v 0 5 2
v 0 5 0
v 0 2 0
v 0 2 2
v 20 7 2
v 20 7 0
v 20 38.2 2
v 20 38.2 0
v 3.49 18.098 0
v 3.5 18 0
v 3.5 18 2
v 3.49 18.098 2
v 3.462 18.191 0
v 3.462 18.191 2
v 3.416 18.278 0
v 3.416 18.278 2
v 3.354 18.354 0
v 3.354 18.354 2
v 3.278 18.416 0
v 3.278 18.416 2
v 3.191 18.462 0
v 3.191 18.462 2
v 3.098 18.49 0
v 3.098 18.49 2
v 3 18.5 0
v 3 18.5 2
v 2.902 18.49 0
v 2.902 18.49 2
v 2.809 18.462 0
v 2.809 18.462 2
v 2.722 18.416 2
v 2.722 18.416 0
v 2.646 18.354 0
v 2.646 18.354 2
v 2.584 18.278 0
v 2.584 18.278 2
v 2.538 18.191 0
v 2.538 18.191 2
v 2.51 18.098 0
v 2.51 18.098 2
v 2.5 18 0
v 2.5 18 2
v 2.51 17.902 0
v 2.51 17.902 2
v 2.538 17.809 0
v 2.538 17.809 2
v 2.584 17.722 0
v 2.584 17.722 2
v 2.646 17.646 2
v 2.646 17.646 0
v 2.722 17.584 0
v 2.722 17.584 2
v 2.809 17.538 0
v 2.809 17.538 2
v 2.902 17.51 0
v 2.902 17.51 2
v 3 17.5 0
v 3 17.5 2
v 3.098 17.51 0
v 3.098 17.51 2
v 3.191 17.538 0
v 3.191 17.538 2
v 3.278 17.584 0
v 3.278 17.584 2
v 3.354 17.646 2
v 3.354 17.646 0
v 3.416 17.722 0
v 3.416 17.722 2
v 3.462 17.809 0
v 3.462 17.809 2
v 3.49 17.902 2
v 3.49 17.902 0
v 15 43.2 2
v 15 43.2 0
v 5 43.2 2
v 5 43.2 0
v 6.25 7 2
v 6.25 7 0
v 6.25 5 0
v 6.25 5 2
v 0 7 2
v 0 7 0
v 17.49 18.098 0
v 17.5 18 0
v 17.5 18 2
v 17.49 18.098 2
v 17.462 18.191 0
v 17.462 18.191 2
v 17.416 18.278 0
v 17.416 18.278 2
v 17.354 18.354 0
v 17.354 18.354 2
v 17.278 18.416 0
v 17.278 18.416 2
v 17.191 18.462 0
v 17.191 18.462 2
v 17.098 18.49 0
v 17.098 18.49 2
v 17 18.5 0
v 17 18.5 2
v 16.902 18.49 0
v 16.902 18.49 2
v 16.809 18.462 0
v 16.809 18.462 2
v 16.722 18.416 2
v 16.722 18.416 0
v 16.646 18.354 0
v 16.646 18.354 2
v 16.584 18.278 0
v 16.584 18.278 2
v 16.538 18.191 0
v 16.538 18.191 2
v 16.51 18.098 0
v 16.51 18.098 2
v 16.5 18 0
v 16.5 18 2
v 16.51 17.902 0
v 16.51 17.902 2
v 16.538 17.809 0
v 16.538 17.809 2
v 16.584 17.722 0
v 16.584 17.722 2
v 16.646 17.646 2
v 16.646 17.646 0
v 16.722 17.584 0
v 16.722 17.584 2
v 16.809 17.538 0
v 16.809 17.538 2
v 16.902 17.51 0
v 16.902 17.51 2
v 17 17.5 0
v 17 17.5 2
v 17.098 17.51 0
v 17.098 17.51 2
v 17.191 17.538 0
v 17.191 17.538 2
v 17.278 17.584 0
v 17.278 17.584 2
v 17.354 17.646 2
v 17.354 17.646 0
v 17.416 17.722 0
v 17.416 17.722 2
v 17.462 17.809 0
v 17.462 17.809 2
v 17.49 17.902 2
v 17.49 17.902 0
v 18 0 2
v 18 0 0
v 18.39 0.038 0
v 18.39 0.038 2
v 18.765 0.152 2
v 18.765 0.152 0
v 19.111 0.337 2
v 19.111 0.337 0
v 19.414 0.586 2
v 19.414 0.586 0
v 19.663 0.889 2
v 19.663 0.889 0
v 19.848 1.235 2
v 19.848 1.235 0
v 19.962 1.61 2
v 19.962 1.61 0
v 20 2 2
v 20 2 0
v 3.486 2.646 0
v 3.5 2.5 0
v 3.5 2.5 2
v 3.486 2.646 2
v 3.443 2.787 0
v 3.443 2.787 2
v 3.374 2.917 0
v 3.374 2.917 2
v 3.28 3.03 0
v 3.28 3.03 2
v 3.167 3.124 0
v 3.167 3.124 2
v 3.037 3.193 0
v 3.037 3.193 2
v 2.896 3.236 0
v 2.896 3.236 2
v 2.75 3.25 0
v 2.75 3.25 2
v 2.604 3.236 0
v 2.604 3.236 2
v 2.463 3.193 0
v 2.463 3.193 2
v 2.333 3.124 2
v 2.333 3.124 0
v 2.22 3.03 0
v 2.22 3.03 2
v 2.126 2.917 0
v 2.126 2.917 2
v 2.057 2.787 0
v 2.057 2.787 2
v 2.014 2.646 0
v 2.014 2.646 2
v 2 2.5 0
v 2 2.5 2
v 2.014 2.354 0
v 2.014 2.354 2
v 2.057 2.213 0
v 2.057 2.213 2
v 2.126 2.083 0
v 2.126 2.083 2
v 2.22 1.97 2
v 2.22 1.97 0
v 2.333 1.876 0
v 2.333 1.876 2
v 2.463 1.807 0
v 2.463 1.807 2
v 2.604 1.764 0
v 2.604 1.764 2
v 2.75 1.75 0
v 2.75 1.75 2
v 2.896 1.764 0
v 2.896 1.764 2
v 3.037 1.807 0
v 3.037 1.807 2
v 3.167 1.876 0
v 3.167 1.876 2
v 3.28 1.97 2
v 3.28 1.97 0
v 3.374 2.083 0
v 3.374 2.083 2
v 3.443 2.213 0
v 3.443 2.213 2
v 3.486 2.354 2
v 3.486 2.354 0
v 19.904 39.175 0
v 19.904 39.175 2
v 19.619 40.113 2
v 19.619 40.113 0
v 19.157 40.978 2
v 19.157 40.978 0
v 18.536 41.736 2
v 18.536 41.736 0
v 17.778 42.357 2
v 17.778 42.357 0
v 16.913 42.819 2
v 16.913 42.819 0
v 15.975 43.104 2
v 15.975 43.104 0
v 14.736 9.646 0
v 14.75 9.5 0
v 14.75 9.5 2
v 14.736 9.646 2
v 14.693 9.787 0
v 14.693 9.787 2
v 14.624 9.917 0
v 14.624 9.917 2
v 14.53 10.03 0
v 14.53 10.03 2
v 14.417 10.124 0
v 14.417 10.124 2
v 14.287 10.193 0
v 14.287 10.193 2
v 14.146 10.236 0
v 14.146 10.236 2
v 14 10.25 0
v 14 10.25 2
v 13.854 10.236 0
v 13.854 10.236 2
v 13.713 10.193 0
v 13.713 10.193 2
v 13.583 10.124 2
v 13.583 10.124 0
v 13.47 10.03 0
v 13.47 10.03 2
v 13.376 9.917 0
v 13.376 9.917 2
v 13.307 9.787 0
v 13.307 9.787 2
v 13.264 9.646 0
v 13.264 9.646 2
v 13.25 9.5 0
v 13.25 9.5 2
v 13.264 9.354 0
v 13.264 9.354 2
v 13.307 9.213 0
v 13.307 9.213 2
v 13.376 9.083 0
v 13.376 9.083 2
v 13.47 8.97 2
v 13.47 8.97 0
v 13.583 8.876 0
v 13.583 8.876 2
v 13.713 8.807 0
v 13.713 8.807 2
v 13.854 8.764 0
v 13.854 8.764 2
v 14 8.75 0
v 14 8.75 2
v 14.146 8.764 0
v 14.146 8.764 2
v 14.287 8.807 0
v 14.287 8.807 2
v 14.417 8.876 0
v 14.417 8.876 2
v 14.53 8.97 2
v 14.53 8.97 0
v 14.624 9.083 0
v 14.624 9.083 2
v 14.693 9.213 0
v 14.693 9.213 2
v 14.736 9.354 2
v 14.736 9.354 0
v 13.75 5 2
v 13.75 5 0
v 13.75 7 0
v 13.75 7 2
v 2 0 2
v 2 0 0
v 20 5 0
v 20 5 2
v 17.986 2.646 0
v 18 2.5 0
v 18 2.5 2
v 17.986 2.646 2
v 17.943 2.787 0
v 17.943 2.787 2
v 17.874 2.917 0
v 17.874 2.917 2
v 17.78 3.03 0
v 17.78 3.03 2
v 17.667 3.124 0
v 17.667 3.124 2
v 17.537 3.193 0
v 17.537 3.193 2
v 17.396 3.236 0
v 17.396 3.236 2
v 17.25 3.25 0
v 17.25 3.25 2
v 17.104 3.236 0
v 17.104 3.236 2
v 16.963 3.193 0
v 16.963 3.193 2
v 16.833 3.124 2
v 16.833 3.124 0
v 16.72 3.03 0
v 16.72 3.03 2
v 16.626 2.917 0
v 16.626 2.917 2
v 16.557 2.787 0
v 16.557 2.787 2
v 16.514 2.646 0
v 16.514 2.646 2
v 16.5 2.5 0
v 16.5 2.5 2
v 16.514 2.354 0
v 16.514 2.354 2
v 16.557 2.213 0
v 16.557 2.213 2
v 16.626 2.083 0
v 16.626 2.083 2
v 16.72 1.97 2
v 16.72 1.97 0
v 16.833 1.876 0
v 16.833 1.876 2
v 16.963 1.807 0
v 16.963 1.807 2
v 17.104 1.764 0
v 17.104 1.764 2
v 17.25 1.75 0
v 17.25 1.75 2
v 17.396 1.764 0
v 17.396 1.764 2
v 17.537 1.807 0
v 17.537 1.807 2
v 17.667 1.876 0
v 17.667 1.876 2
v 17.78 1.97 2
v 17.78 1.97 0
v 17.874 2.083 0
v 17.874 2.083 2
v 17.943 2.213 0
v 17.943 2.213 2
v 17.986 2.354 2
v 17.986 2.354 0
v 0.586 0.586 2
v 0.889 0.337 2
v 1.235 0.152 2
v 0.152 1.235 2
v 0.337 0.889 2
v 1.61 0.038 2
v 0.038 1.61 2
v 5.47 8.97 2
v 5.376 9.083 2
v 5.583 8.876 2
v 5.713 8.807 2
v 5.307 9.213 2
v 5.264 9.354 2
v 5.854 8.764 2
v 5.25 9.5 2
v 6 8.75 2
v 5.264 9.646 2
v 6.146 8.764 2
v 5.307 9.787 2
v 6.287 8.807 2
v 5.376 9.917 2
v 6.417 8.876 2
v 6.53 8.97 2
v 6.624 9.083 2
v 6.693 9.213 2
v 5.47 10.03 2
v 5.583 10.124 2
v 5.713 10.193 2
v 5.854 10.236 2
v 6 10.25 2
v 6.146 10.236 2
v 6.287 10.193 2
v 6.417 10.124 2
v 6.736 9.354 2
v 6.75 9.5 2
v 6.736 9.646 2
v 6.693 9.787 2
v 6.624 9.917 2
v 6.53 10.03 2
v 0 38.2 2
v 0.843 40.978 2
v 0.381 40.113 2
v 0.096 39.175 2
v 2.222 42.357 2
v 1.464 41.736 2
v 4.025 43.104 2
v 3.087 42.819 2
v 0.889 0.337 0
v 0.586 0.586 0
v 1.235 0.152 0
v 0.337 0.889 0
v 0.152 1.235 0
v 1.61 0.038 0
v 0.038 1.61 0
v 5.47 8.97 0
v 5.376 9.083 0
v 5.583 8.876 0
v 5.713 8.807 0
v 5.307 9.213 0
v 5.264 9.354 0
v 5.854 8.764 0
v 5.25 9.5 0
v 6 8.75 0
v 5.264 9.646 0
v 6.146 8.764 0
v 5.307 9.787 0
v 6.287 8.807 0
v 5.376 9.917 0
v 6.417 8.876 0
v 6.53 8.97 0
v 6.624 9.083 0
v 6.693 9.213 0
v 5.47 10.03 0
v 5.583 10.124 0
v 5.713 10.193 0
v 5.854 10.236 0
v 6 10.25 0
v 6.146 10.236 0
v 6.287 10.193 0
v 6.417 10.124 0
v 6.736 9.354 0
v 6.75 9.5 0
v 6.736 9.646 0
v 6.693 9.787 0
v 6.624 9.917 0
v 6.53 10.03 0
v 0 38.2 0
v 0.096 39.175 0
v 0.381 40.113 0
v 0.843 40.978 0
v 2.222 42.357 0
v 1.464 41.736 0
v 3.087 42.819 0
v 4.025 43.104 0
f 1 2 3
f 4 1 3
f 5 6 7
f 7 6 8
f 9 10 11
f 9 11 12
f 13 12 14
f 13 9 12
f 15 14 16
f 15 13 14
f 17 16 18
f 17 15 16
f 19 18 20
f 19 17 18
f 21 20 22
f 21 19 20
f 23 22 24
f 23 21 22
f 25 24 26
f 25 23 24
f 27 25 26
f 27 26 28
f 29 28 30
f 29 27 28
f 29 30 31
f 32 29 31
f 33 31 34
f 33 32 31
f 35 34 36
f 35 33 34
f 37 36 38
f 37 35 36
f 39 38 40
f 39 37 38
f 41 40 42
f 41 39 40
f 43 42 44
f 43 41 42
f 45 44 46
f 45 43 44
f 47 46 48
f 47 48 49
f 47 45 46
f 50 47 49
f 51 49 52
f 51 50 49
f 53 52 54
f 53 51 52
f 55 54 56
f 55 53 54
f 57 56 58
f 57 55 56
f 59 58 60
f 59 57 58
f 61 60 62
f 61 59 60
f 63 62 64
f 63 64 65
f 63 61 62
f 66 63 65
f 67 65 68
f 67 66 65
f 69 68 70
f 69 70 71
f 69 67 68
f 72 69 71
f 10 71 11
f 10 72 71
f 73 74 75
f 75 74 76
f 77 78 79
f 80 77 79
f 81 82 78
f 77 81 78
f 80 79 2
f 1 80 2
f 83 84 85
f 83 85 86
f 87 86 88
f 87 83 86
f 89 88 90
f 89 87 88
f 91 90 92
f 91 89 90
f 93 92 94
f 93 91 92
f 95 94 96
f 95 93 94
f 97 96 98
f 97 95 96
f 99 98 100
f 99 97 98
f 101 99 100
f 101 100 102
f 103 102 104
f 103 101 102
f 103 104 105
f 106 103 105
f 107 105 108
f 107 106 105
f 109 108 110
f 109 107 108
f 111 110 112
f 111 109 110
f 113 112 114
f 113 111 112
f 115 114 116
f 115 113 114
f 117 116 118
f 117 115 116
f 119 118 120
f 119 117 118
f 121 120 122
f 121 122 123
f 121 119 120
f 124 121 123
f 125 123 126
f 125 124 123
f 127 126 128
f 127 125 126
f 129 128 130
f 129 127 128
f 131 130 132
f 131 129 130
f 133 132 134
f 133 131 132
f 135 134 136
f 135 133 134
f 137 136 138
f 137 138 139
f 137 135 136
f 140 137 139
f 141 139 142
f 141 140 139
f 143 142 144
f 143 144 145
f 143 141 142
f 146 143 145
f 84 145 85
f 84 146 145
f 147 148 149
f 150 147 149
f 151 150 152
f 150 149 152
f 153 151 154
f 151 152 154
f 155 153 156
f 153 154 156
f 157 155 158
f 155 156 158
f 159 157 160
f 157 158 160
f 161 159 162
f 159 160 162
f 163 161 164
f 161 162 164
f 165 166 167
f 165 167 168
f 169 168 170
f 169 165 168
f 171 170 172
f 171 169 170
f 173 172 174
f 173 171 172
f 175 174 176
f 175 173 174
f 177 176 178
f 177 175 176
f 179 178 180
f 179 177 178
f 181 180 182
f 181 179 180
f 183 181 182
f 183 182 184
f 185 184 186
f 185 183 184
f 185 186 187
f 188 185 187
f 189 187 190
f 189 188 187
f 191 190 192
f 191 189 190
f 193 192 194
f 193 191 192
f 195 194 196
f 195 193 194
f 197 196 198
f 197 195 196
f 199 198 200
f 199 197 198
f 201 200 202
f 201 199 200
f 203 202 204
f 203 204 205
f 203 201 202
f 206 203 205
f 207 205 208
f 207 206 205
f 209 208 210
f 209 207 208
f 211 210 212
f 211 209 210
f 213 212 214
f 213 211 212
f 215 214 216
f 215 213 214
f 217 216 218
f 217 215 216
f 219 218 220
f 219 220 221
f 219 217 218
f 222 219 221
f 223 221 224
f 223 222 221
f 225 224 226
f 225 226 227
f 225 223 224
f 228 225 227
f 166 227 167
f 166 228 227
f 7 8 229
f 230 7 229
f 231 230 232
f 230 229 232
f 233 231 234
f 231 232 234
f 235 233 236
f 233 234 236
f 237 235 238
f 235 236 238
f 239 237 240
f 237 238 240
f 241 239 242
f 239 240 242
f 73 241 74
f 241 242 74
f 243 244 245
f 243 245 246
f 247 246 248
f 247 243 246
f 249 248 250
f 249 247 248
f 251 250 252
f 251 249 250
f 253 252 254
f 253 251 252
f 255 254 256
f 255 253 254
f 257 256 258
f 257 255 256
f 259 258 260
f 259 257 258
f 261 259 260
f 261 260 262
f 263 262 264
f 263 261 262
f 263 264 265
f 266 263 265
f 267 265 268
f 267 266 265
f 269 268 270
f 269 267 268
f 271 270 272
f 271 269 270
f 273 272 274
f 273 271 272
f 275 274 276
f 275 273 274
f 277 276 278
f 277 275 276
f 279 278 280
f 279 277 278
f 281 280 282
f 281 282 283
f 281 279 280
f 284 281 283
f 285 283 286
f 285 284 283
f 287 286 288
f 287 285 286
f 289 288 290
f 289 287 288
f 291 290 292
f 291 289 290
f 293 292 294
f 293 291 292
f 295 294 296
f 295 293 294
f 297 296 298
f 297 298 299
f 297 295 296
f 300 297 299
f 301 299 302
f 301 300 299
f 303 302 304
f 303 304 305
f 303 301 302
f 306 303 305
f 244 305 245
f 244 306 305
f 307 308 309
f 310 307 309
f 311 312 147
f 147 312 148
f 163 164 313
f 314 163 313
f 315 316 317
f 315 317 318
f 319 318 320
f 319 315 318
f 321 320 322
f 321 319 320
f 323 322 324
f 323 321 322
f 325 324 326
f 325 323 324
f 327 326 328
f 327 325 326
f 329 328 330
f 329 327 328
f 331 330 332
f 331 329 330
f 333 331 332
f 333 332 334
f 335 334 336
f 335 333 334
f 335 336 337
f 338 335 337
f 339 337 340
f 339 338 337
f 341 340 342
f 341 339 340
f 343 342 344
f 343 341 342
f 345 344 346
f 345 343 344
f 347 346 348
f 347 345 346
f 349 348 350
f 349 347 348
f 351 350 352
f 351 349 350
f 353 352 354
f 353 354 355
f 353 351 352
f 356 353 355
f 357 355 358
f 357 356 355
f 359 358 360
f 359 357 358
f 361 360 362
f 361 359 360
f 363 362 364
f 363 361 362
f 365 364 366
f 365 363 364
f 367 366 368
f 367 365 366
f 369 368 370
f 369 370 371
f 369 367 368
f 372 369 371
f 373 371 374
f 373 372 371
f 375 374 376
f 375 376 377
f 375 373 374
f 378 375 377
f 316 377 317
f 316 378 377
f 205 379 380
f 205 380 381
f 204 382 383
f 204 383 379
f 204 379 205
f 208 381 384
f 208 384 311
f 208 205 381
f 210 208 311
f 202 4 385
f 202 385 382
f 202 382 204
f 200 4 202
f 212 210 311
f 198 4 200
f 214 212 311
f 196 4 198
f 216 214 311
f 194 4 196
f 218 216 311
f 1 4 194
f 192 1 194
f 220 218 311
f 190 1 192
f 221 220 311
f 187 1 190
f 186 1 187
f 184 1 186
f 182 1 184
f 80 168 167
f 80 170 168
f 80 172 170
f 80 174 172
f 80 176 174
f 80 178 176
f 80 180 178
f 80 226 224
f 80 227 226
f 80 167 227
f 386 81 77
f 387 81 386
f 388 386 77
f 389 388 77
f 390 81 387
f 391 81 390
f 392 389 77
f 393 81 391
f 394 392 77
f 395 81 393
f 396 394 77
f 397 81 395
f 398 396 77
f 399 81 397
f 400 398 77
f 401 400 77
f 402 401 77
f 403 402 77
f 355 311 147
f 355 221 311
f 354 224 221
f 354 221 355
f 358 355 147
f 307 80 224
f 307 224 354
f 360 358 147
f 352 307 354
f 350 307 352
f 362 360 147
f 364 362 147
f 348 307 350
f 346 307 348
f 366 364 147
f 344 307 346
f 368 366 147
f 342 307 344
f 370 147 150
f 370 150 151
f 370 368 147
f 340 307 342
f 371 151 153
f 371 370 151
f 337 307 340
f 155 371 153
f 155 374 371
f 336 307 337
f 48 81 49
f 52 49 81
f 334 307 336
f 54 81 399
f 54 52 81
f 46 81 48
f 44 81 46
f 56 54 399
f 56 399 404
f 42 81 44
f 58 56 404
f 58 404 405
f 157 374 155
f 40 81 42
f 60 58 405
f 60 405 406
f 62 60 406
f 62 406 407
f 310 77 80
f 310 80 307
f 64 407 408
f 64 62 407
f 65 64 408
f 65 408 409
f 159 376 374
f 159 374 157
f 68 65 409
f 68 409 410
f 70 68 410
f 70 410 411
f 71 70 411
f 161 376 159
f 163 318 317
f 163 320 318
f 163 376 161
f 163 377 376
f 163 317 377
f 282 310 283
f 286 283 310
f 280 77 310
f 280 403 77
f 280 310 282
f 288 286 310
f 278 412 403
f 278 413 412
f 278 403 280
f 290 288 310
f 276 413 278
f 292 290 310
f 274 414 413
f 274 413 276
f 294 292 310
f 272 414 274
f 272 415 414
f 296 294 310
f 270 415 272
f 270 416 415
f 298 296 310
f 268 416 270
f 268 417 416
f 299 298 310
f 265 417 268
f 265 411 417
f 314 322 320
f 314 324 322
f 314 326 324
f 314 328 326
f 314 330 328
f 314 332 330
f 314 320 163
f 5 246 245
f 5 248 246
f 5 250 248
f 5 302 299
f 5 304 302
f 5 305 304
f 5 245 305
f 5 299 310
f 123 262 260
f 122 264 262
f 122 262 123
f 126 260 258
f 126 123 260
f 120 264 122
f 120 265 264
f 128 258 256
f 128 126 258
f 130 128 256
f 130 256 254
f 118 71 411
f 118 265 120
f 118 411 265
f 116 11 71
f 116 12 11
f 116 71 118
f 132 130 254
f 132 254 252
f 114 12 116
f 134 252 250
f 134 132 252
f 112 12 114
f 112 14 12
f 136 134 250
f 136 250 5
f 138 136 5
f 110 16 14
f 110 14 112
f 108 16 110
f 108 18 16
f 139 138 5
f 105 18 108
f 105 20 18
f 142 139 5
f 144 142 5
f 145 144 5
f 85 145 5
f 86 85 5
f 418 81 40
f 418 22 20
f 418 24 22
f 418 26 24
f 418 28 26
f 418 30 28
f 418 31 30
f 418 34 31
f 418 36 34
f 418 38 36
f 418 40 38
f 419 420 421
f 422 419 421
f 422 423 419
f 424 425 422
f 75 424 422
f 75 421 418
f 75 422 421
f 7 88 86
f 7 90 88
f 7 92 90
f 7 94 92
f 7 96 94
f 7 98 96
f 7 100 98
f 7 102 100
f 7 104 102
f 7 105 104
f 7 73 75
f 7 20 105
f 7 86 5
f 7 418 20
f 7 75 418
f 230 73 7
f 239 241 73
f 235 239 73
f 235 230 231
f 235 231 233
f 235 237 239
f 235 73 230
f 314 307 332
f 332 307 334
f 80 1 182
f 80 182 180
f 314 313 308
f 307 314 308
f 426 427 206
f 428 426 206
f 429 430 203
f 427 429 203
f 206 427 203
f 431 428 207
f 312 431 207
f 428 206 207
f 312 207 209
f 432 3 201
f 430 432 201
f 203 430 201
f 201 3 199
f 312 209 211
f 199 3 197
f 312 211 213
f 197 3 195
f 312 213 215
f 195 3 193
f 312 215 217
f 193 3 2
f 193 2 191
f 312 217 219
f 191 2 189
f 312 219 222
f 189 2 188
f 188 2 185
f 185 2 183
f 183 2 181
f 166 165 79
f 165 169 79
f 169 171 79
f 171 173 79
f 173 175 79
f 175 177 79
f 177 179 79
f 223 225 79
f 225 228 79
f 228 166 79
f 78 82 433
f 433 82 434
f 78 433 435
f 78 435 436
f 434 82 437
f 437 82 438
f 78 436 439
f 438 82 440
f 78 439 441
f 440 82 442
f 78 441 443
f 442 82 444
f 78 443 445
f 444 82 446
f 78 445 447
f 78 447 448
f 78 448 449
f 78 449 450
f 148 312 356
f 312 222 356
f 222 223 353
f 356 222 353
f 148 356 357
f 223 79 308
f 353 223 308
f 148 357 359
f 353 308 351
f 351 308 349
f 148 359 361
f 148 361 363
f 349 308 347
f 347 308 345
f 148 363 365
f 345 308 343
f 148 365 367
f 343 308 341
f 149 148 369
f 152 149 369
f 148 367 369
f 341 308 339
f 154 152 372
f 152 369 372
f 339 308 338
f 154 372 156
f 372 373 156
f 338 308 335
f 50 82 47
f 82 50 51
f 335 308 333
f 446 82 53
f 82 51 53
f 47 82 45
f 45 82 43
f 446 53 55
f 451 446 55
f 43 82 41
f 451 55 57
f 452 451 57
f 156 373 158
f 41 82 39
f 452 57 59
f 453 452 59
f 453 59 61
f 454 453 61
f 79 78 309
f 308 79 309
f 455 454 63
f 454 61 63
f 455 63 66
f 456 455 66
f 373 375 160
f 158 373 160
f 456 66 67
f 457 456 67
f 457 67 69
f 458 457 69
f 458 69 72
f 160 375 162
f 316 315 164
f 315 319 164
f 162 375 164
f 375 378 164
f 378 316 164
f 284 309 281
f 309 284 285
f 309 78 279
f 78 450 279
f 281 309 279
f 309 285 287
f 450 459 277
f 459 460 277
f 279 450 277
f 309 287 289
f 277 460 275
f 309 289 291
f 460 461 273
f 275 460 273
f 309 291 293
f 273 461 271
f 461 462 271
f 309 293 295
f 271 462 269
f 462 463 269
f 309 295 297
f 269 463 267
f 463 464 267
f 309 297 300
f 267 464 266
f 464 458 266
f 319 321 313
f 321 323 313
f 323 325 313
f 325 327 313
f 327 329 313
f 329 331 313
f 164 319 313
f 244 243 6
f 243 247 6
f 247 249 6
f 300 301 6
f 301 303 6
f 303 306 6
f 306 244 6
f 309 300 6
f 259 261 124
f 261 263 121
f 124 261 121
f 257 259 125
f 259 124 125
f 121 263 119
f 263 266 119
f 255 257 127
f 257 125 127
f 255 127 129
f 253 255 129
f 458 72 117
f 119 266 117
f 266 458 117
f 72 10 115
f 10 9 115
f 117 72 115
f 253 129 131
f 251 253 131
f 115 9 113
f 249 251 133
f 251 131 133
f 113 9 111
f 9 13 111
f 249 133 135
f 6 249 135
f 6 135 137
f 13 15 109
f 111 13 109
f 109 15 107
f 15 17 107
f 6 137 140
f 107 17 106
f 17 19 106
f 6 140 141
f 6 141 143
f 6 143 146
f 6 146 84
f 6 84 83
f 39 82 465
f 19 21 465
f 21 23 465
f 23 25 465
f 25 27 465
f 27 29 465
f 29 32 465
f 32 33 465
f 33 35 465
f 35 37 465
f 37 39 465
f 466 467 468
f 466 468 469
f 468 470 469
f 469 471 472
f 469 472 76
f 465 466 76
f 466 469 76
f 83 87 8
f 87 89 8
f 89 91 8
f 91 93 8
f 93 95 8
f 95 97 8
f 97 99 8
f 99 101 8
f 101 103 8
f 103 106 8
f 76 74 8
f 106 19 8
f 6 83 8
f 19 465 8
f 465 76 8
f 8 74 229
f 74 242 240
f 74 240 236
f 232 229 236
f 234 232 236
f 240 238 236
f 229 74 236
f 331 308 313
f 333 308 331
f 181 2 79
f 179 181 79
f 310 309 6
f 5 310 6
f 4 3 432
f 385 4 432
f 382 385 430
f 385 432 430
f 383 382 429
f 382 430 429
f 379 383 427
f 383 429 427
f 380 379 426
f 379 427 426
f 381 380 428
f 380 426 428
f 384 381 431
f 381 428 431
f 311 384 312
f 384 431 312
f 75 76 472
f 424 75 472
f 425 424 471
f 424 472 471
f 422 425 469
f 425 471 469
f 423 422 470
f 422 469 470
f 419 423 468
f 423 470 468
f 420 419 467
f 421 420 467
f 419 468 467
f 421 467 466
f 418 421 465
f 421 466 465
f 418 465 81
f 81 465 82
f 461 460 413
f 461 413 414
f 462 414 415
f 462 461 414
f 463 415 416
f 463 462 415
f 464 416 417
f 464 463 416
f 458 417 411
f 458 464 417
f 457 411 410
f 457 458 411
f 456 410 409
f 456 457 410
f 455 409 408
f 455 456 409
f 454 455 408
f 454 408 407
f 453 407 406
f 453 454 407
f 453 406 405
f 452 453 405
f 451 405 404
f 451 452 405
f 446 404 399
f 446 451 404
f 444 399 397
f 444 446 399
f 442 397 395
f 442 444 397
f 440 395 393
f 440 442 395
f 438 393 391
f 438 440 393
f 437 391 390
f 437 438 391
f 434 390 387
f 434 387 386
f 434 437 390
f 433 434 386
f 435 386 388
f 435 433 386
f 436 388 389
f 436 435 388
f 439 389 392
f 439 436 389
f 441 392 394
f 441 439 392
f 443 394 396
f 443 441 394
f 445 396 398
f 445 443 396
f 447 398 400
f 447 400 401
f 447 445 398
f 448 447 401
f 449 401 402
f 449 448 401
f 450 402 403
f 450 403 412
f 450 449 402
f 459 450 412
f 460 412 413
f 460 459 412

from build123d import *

# Parameters (mm, degrees)
MODEL_R             = 0.5
MODEL_R_2           = 0.75
BOSS_EXTRUDE1_DEPTH = 2


with BuildPart() as part:
    # Model → Boss-Extrude1 (new body)
    with BuildSketch(Plane.XY):
        with BuildLine():
            Line((2, 0), (18, 0))
            ThreePointArc((18, 0), (19.414213562, 0.585786438), (20, 2))
            Line((20, 2), (20, 5))
            Line((20, 5), (13.75, 5))
            Line((13.75, 5), (13.75, 7))
            Line((13.75, 7), (20, 7))
            Line((20, 7), (20, 38.2))
            ThreePointArc((20, 38.2), (18.535533906, 41.735533906), (15, 43.2))
            Line((15, 43.2), (5, 43.2))
            ThreePointArc((5, 43.2), (1.464466094, 41.735533906), (0, 38.2))
            Line((0, 38.2), (0, 7))
            Line((0, 7), (6.25, 7))
            Line((6.25, 7), (6.25, 5))
            Line((6.25, 5), (0, 5))
            Line((0, 5), (0, 2))
            ThreePointArc((0, 2), (0.585786438, 0.585786438), (2, 0))
        make_face()
        with Locations((3, 18)):
            Circle(MODEL_R, mode=Mode.SUBTRACT)
        with Locations((17, 18)):
            Circle(MODEL_R, mode=Mode.SUBTRACT)
        with Locations((14, 9.5)):
            Circle(MODEL_R_2, mode=Mode.SUBTRACT)
        with Locations((6, 9.5)):
            Circle(MODEL_R_2, mode=Mode.SUBTRACT)
        with Locations((17.25, 2.5)):
            Circle(MODEL_R_2, mode=Mode.SUBTRACT)
        with Locations((2.75, 2.5)):
            Circle(MODEL_R_2, mode=Mode.SUBTRACT)
    extrude(amount=BOSS_EXTRUDE1_DEPTH)


solid = part.part
